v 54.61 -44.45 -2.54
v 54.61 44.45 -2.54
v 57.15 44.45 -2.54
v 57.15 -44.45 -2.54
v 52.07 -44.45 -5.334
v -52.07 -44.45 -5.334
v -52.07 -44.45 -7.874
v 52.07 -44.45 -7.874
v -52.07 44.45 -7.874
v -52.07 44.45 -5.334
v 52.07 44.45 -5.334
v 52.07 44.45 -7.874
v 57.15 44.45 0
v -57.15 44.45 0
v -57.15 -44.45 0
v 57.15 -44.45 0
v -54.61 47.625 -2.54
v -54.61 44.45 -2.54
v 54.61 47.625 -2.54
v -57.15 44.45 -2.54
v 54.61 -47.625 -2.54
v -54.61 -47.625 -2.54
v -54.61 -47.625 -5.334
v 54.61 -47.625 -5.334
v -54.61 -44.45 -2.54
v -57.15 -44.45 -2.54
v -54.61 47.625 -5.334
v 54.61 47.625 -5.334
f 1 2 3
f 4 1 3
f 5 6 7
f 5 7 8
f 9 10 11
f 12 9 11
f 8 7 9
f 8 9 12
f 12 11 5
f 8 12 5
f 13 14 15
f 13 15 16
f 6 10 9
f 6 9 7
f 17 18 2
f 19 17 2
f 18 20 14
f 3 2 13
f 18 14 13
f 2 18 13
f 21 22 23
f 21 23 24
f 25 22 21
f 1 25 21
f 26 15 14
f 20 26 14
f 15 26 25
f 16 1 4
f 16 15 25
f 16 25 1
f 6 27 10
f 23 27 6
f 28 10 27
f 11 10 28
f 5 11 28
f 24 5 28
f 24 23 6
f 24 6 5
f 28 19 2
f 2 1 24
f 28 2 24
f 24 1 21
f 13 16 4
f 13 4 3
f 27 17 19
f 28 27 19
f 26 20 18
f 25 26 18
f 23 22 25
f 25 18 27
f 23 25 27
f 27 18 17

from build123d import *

# Parameters (mm, degrees)
F0_W     = 114.3
F0_H     = 88.9
F1_DEPTH = 2.54
F2_W     = 109.22
F2_H     = 3.175
F2_H_2   = 88.9
F3_DEPTH = 2.794
F4_W     = 104.14
F4_H     = 88.9
F5_DEPTH = 2.54


with BuildPart() as f1:
    # F0 (on Top) → F1 (new body)
    with BuildSketch(Plane.XY):
        Rectangle(F0_W, F0_H)
    extrude(amount=-F1_DEPTH)

    # F2 (on face) → F3 (join)
    with BuildSketch(Plane(origin=(0, 0, -2.54), x_dir=(1, 0, 0), z_dir=(0, 0, -1))):
        with Locations((0, 46.0375)):
            Rectangle(F2_W, F2_H)
        Rectangle(F2_W, F2_H_2)
        with Locations((0, -46.0375)):
            Rectangle(F2_W, F2_H)
    extrude(amount=F3_DEPTH)

    # F4 (on face) → F5 (join)
    with BuildSketch(Plane(origin=(0, 0, -5.334), x_dir=(1, 0, 0), z_dir=(0, 0, -1))):
        Rectangle(F4_W, F4_H)
    extrude(amount=F5_DEPTH)


solid = f1.part
